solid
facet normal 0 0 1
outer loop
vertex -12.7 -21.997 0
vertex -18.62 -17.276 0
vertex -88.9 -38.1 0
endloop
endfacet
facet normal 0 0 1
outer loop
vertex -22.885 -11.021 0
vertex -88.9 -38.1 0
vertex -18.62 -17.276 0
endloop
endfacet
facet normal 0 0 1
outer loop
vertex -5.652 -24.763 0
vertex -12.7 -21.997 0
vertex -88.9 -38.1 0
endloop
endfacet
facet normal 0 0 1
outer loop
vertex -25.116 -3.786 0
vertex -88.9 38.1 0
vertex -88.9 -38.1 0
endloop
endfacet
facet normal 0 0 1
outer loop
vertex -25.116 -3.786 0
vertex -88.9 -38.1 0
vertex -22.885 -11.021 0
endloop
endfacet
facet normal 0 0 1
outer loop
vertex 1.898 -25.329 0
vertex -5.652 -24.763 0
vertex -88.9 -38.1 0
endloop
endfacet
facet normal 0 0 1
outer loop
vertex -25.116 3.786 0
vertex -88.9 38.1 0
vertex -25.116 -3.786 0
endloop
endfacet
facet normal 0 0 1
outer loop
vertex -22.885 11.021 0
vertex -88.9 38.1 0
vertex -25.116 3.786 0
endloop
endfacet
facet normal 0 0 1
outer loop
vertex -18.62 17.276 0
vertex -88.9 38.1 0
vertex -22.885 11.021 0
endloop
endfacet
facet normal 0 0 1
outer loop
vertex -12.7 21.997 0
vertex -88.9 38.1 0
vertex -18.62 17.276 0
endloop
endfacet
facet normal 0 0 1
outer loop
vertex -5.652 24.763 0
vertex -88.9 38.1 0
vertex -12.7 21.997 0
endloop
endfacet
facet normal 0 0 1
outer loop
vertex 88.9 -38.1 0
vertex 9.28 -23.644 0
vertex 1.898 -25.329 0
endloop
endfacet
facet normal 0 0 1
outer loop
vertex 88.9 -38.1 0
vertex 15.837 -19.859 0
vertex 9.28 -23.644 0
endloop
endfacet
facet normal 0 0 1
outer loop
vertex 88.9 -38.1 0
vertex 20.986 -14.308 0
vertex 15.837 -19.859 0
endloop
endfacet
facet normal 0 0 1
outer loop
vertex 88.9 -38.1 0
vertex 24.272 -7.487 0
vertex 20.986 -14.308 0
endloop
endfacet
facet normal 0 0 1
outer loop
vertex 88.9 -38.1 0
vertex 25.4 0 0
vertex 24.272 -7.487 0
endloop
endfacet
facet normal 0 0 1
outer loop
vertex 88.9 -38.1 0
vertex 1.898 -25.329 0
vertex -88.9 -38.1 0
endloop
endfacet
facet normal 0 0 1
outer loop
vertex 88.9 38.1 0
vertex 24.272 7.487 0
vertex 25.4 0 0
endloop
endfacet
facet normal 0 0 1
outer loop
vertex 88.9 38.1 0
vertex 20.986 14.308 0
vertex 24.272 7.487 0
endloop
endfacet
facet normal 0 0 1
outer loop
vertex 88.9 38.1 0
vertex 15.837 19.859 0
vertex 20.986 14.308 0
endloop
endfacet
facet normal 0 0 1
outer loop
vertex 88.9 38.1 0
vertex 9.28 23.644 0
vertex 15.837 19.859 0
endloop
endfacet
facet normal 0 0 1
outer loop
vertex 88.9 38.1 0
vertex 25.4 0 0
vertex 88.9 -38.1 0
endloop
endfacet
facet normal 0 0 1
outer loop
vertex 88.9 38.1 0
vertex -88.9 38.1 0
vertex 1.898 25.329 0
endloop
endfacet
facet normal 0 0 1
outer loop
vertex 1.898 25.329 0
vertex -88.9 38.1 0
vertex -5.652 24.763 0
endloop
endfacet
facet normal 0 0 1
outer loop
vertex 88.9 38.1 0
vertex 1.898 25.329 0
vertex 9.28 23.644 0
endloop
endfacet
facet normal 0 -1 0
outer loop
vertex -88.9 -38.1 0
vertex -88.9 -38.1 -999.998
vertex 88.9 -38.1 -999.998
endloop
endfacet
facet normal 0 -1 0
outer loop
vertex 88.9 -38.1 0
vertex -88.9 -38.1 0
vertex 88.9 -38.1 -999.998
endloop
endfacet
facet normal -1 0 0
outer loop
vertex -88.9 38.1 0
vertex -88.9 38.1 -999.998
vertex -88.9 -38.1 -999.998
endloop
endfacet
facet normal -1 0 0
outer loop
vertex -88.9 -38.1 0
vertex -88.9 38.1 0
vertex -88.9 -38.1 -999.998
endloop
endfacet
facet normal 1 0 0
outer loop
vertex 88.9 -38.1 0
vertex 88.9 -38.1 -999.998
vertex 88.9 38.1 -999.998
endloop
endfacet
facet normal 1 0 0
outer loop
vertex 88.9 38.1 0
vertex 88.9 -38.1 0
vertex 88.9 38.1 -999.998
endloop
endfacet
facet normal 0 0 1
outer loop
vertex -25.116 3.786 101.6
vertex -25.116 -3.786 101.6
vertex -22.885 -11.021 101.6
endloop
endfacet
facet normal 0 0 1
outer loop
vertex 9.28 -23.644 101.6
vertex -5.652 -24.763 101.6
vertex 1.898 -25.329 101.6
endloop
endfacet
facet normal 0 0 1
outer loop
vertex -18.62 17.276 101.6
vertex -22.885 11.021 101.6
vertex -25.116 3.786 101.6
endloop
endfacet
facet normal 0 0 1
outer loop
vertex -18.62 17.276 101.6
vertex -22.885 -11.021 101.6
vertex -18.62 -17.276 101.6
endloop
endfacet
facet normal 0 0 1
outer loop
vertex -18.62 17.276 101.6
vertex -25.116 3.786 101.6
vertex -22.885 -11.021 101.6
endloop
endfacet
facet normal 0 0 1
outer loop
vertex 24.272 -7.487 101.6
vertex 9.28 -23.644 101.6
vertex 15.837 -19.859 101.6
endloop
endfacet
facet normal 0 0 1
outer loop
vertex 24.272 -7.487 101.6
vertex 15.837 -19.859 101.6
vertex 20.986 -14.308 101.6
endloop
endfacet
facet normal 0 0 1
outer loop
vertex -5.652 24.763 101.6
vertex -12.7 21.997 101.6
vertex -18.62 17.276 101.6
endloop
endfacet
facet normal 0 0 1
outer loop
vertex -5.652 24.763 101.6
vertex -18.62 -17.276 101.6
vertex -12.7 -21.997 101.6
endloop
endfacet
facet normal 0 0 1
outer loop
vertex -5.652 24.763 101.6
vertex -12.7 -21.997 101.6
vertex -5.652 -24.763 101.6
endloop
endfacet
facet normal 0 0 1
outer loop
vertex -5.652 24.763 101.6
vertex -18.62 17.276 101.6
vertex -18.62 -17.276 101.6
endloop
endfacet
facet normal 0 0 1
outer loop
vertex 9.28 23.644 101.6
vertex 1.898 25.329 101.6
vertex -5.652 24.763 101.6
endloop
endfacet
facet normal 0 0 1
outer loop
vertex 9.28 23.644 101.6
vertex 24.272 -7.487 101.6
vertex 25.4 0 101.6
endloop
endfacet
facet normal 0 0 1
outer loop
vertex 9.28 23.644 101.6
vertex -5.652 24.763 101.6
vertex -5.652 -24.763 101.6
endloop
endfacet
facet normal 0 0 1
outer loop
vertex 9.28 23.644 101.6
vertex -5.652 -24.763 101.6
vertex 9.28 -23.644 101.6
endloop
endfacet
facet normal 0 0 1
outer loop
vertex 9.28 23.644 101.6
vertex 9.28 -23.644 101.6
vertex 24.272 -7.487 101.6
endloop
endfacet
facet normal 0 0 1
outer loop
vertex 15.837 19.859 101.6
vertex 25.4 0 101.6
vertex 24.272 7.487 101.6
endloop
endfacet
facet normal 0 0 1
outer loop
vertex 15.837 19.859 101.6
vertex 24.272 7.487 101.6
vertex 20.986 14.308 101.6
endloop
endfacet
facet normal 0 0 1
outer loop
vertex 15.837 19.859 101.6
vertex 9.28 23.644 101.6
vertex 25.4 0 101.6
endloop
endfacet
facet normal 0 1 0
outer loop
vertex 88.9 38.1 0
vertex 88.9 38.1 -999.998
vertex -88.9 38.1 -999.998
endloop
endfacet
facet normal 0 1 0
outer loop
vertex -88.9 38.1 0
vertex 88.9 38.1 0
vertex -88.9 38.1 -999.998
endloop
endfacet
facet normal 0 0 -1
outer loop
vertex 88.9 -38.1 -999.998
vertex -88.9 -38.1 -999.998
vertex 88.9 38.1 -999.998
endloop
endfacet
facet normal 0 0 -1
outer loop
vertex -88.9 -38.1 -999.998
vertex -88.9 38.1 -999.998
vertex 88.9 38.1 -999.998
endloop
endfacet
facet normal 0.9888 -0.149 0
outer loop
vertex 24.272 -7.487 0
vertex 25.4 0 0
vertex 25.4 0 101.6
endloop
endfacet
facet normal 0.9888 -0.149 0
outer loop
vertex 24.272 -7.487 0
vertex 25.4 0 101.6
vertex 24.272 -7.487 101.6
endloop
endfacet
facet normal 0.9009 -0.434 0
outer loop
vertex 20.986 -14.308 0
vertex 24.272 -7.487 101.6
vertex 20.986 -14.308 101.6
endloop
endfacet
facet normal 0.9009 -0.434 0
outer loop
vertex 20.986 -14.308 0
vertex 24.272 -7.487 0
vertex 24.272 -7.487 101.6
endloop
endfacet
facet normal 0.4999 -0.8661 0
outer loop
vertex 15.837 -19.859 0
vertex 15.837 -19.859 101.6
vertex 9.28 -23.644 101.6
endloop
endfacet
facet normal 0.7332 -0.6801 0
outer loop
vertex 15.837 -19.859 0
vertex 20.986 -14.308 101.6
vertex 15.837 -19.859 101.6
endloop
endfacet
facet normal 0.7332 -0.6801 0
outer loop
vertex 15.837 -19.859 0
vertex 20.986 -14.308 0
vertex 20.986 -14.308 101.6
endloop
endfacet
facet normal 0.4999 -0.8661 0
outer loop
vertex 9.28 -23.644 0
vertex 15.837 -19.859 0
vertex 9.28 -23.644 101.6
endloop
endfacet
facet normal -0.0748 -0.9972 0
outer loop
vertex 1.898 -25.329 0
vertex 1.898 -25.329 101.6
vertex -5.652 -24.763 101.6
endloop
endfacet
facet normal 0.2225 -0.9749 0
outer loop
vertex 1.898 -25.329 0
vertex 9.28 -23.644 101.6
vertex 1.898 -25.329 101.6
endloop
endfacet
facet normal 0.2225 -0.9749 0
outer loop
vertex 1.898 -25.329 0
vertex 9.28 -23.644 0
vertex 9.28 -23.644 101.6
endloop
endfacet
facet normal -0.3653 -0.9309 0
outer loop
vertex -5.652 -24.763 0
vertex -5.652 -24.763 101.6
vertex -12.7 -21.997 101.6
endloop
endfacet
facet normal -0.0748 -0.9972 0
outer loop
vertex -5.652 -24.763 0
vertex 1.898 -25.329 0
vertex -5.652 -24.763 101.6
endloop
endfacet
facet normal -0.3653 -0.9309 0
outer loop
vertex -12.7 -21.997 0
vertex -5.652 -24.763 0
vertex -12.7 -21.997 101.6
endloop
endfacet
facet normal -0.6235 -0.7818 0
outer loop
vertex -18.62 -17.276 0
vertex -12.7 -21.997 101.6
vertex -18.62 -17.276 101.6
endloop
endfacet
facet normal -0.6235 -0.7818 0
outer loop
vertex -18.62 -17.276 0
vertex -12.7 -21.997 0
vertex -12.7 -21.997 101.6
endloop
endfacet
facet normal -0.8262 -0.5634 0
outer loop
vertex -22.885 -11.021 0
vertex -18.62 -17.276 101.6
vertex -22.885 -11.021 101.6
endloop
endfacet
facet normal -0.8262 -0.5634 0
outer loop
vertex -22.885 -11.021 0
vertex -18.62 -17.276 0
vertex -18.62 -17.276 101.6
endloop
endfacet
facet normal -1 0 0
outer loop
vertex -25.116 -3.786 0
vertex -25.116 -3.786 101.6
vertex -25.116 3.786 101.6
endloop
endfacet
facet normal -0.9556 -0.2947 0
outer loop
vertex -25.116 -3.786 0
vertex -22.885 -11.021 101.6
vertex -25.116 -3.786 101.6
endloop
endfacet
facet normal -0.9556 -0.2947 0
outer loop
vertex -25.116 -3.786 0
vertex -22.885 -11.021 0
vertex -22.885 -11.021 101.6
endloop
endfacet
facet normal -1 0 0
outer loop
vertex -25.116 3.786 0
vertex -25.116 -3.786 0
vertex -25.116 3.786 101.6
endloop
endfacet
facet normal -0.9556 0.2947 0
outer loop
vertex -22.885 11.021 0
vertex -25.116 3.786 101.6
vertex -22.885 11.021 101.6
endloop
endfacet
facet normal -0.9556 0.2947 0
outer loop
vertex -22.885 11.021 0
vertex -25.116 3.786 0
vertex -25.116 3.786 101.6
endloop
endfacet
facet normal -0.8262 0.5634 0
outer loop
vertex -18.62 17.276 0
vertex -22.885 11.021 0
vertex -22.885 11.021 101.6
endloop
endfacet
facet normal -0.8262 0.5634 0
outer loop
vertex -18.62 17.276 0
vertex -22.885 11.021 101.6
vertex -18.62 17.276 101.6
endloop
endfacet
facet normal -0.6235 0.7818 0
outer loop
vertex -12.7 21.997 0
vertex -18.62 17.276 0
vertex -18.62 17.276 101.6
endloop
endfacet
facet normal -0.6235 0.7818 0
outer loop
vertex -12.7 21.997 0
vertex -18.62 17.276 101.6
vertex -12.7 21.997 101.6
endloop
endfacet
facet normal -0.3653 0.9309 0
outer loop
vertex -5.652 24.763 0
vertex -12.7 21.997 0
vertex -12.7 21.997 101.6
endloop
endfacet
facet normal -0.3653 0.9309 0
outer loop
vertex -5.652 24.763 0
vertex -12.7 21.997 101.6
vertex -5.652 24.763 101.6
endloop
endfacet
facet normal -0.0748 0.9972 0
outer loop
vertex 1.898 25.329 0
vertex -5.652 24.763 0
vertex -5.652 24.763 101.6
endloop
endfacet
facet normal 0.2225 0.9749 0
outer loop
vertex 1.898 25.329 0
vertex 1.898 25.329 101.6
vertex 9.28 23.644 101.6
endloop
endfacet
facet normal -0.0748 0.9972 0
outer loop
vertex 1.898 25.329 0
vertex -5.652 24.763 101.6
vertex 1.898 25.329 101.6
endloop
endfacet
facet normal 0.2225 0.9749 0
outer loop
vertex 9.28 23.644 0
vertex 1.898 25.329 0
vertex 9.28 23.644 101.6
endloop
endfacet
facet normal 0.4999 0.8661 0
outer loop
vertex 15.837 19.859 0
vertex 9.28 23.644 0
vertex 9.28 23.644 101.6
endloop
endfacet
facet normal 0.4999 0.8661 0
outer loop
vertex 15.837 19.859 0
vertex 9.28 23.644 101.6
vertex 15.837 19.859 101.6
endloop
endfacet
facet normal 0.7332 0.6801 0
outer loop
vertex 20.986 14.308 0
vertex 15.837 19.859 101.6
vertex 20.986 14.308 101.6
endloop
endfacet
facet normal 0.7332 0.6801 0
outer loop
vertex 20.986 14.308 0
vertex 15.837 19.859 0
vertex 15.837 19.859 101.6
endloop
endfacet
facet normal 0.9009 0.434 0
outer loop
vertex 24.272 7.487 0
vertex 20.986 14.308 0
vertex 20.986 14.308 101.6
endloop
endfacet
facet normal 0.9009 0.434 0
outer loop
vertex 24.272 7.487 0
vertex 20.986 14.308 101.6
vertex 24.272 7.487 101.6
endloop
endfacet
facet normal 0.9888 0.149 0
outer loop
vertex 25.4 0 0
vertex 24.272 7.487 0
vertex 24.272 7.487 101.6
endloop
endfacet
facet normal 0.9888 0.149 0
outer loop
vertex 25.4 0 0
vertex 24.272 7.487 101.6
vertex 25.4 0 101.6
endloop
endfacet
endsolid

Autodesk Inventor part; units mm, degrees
ref_plane "YZ Plane" through (0, 0, 0) normal (1, 0, 0) x (0, 1, 0)
ref_plane "XZ Plane" through (0, 0, 0) normal (0, 1, 0) x (-1, 0, 0)
ref_plane "XY Plane" through (0, 0, 0) normal (0, 0, 1) x (1, 0, 0)
sketch "Sketch1" plane through (0, 0, 0) normal (0, 0, 1) x (1, 0, 0)
  circle A0 centre (0, 0) radius 25.4
  dimension "d0" = 50.8
extrude "Extrusion1" add sketch "Sketch1" along normal blind 101.6
sketch "Sketch2" plane through (0, 0, 0) normal (0, 0, 1) x (1, 0, 0)
  line L0 (88.9, 38.1) -> (-88.9, 38.1)
  line L1 (-88.9, 38.1) -> (-88.9, -38.1)
  line L2 (-88.9, -38.1) -> (88.9, -38.1)
  line L3 (88.9, -38.1) -> (88.9, 38.1)
  point P0 (0, 0)
  point P1 (0, 38.1)
  point P2 (88.9, 0)
  dimension "d3" = 76.2
  dimension "d4" = 177.8
extrude "Extrusion2" add sketch "Sketch2" against normal blind 999.998
properties part number "solid_for_CFD_test_06(testing device)"
